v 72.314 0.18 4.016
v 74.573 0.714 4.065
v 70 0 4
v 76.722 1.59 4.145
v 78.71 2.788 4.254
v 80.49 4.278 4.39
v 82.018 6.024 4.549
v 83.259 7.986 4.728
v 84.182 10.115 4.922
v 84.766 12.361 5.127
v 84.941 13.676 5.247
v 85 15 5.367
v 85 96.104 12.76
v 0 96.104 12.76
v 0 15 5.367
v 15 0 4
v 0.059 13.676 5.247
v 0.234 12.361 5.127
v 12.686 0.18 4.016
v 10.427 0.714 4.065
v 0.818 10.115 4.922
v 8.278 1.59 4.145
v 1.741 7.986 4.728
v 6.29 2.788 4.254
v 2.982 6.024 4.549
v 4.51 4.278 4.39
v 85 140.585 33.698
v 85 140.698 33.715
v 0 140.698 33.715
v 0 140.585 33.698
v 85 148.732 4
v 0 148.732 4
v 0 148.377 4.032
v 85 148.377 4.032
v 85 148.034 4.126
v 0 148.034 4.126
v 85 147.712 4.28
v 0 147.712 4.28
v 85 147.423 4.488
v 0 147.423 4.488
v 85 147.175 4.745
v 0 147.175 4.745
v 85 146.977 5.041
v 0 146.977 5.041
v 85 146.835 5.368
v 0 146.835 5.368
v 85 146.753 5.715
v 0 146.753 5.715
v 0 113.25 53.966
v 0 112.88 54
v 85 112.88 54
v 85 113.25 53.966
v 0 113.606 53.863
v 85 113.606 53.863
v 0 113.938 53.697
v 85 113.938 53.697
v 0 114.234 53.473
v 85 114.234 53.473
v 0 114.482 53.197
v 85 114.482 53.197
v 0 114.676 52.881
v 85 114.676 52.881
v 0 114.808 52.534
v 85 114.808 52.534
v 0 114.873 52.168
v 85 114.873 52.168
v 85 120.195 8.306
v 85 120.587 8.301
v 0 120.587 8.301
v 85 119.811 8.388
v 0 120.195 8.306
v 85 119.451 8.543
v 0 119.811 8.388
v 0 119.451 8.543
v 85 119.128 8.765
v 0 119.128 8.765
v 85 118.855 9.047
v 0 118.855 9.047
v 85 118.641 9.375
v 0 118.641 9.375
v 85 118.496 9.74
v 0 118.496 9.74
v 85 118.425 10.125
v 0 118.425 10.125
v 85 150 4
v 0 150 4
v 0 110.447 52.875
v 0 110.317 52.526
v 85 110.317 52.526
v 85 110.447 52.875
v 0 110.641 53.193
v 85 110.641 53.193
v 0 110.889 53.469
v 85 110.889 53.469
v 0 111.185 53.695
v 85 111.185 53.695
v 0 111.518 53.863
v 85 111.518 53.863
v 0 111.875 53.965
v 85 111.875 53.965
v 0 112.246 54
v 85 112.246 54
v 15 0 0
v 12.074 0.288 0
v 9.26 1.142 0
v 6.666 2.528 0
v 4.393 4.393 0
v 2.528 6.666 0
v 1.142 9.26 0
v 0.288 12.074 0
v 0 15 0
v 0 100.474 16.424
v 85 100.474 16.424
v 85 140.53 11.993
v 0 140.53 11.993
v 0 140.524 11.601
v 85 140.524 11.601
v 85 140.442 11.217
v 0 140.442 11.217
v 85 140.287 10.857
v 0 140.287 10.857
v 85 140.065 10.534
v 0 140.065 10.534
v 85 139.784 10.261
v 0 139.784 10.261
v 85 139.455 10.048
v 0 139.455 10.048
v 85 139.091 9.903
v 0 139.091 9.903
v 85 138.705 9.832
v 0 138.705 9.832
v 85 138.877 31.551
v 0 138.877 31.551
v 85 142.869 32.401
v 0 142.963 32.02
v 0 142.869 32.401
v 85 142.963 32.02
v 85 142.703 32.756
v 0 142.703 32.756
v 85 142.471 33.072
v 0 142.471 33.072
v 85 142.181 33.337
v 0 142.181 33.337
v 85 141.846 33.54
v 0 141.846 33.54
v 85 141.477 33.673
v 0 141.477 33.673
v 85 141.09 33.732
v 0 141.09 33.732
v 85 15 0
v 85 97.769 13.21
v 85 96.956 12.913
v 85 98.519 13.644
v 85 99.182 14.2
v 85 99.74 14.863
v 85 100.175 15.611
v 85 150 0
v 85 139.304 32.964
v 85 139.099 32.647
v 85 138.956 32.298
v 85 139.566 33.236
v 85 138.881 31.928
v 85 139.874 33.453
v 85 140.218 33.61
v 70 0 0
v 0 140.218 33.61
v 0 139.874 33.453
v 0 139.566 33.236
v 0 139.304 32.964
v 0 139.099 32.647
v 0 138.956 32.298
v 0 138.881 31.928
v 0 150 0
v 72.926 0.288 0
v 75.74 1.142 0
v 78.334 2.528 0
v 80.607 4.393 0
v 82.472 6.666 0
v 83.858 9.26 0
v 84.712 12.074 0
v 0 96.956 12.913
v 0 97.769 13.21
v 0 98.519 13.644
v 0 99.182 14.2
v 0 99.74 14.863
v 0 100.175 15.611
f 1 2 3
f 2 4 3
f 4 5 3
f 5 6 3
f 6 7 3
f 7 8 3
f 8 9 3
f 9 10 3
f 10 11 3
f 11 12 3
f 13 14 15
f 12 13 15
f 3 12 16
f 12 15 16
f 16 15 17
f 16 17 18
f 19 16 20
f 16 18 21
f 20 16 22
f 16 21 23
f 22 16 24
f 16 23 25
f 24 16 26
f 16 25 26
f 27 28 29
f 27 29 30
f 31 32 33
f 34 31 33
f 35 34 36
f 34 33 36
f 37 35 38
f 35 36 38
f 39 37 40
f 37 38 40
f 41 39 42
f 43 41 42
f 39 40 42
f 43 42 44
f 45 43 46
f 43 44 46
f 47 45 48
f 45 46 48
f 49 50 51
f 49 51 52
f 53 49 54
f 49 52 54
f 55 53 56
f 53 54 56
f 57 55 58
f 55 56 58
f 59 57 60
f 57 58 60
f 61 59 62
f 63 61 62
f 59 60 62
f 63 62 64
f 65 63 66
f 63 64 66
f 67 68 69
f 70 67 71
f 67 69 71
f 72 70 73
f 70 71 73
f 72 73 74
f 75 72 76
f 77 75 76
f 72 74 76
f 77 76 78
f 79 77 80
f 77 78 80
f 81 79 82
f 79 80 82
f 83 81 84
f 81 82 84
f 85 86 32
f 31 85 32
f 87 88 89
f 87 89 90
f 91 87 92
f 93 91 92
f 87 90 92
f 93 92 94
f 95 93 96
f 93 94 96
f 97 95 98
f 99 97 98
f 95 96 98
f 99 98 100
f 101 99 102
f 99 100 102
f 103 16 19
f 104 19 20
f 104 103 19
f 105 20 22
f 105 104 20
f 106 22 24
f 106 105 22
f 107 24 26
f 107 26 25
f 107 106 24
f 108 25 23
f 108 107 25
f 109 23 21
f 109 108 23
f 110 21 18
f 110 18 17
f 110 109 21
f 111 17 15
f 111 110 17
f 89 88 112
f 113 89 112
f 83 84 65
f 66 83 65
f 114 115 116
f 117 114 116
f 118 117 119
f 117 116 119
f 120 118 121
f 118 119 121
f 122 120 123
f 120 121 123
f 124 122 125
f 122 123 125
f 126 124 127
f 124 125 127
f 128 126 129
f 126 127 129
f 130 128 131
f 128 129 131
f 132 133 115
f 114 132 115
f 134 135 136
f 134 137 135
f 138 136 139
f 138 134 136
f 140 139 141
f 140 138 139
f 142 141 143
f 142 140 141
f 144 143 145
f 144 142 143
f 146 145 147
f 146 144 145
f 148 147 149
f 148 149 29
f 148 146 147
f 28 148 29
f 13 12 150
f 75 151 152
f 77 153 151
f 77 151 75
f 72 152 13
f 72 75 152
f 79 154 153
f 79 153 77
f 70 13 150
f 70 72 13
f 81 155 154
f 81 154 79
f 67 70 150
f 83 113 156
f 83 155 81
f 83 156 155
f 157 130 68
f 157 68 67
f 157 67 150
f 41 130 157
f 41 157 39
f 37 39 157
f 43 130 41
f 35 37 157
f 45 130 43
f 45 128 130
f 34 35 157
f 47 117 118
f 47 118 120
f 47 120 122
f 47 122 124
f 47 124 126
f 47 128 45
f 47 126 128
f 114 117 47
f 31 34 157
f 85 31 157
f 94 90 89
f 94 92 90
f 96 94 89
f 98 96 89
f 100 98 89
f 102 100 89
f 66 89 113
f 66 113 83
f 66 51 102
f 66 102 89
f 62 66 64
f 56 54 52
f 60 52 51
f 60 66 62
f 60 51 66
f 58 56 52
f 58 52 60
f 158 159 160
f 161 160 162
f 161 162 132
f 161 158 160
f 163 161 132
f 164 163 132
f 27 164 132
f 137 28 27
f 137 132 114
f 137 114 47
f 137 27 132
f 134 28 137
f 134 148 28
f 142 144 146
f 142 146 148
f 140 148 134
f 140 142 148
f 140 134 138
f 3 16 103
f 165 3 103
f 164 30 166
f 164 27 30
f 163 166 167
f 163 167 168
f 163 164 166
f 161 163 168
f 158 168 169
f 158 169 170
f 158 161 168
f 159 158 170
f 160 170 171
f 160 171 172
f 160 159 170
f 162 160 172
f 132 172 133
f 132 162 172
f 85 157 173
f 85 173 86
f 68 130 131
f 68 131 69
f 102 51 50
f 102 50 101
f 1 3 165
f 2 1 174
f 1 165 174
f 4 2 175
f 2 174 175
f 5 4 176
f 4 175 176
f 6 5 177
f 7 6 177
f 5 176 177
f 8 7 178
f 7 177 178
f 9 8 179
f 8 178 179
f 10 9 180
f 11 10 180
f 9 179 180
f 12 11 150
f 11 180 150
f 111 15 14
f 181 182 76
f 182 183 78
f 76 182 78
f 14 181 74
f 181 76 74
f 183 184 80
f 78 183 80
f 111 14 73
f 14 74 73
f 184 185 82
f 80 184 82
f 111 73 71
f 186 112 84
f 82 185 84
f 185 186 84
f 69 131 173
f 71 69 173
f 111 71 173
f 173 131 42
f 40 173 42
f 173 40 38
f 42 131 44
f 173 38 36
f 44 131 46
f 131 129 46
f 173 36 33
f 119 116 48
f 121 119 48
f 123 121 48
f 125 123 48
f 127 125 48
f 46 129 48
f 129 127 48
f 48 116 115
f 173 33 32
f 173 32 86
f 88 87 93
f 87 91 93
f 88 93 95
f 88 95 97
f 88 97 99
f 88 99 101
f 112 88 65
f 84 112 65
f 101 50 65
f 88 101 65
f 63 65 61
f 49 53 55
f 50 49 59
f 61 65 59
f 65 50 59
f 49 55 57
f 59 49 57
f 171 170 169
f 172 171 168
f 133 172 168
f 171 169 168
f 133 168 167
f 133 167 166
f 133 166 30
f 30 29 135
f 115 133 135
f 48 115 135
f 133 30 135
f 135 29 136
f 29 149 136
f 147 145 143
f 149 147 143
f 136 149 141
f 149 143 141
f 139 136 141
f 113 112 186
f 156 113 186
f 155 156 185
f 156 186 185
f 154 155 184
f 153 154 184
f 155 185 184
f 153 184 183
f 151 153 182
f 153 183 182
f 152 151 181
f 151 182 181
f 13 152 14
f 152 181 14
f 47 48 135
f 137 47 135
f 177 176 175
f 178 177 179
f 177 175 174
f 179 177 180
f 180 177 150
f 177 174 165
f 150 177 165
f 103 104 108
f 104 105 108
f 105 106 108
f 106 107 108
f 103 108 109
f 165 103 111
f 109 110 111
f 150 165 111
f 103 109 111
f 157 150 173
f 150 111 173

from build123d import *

# Parameters (mm, degrees)
F1_DEPTH = 85
F2_R     = 15
F3_R     = 2


# Not quite as in the source:
# - a feature of the source that left no trace in its solid (it failed there, or was rolled back) is left out


with BuildPart() as f1:
    # F0 (on Right) → F1 (new body)
    with BuildSketch(Plane.YZ):
        with BuildLine():
            Line((0, 4), (0, 0))
            Line((0, 0), (150, 0))
            Line((150, 0), (150, 4))
            Line((150, 4), (148.7324850447, 4))
            ThreePointArc((148.7324850447, 4), (147.4229901607, 4.4883045449), (146.7529275801, 5.7147768512))
            Line((146.7529275801, 5.7147768512), (142.6774710417, 34))
            Line((142.6774710417, 34), (138.7183561126, 33.4295537023))
            Line((138.7183561126, 33.4295537023), (140.5295339709, 11.9928994727))
            ThreePointArc((140.5295339709, 11.9928994727), (140.064889591, 10.5343894965), (138.7050141045, 9.8316203937))
            Line((138.7050141045, 9.8316203937), (120.5865966006, 8.3007995736))
            ThreePointArc((120.5865966006, 8.3007995736), (119.1280866244, 8.7654439535), (118.4253175217, 10.12531944))
            Line((118.4253175217, 10.12531944), (114.7183561126, 54))
            Line((114.7183561126, 54), (110.7183561126, 54))
            Line((110.7183561126, 54), (100.473891609, 16.4240136891))
            ThreePointArc((100.473891609, 16.4240136891), (98.862490978, 13.9077784109), (96.1038236872, 12.759820769))
            Line((96.1038236872, 12.759820769), (0, 4))
        make_face()
    extrude(amount=F1_DEPTH)

    # F2
    f2_edges = [f1.edges().sort_by_distance(p)[0] for p in [
        (85, 0, 2),
        (0, 0, 2),
    ]]
    fillet(f2_edges, radius=F2_R)

    # F3
    f3_edges = [f1.edges().sort_by_distance(p)[0] for p in [
        (42.5, 110.718356, 54),
        (42.5, 114.718356, 54),
        (42.5, 138.718356, 33.429554),
        (42.5, 142.677471, 34),
    ]]
    fillet(f3_edges, radius=F3_R)


solid = f1.part
